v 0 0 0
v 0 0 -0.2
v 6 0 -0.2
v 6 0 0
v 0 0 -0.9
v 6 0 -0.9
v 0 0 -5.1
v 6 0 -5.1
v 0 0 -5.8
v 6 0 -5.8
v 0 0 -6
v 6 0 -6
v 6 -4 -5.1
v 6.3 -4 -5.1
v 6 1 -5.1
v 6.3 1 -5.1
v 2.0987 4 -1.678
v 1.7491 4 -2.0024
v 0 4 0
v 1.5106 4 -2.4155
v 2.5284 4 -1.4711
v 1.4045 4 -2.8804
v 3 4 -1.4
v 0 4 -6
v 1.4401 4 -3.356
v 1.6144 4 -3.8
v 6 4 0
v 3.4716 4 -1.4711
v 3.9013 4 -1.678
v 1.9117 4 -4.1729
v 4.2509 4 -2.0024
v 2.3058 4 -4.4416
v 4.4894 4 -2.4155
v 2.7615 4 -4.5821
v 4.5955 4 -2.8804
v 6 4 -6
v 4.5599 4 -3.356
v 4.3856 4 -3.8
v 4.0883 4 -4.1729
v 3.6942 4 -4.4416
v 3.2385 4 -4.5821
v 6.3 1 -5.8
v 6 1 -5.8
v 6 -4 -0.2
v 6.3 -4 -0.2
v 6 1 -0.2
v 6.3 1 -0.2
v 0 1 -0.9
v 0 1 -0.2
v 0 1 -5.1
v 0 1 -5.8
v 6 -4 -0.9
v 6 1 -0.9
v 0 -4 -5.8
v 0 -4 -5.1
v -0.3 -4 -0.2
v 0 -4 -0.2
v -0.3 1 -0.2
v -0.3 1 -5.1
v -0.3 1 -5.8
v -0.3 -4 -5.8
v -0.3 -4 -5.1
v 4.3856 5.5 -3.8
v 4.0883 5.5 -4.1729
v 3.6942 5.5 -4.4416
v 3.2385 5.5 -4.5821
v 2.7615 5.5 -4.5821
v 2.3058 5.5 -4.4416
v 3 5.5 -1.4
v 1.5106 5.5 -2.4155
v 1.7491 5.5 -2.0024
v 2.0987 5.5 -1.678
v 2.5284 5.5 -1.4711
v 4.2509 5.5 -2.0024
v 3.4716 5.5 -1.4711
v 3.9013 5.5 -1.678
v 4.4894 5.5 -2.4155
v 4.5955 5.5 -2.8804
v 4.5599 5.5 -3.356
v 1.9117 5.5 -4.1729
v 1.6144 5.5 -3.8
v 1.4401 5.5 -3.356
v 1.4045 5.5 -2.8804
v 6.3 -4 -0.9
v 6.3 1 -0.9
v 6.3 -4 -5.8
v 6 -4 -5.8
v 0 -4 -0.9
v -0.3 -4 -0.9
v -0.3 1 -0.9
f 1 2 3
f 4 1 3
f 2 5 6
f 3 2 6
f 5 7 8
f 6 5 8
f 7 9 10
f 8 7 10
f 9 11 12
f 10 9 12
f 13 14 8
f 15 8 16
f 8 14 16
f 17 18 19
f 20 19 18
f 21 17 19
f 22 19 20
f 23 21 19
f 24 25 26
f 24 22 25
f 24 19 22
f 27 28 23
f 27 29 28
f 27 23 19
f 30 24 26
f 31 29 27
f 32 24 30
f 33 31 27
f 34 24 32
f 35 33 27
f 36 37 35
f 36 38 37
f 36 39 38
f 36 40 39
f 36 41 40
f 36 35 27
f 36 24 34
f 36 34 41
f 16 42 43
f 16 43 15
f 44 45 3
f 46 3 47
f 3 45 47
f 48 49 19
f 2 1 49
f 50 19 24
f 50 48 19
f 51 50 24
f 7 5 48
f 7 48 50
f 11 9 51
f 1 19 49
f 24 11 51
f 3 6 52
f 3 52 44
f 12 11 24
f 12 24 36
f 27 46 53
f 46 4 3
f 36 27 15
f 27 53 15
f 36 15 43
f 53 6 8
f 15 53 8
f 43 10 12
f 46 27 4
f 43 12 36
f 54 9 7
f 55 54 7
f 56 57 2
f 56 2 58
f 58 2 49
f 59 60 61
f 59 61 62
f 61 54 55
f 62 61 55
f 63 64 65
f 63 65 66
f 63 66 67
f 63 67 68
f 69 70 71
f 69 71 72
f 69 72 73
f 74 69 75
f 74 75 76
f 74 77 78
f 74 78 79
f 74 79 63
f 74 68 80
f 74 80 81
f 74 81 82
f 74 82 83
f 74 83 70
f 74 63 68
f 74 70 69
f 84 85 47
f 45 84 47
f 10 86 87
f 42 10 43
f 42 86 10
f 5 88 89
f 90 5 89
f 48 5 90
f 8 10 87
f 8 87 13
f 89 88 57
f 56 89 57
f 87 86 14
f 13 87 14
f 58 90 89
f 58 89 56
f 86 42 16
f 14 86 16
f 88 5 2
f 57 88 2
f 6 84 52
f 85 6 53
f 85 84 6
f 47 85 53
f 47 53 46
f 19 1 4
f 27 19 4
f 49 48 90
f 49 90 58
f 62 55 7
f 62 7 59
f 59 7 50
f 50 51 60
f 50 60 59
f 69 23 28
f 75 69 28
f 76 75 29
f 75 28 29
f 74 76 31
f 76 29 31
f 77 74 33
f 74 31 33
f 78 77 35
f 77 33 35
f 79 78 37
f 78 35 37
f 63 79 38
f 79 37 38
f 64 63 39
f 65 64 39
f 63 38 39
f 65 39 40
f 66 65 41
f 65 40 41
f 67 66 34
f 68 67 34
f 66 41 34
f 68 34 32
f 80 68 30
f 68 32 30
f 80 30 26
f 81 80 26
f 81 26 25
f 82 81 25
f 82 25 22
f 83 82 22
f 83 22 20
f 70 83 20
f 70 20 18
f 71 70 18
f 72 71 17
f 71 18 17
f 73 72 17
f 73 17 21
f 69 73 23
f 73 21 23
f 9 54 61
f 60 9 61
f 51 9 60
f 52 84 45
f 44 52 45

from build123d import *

# Parameters (mm, degrees)
SKETCH1_W                 = 6
SKETCH1_H                 = 6
BOSS_EXTRUDE1_DEPTH       = 4
SKETCH2_R                 = 1.6
BOSS_EXTRUDE2_DEPTH       = 1.5
SKETCH3_W                 = 0.7
SKETCH3_H                 = 5
BOSS_EXTRUDE3_DEPTH       = 0.3
LPATTERN2_COUNT           = 2
LPATTERN2_PITCH           = 6.3
LPATTERN3_COUNT           = 2
LPATTERN3_PITCH           = 4.9
LPATTERN3_COPY_1_SKETCH_W = 0.7
LPATTERN3_COPY_1_SKETCH_H = 5
LPATTERN3_COPY_1_DEPTH    = 0.3


with BuildPart() as part:
    # Sketch1 → Boss-Extrude1 (new body)
    with BuildSketch(Plane(origin=(0, 0, 0), x_dir=(1, 0, 0), z_dir=(0, 1, 0))):
        with Locations((3, 3)):
            Rectangle(SKETCH1_W, SKETCH1_H)
    extrude(amount=BOSS_EXTRUDE1_DEPTH)

    # Sketch2 → Boss-Extrude2 (add)
    with BuildSketch(Plane(origin=(0, 4, 0), x_dir=(1, 0, 0), z_dir=(0, 1, 0))):
        with Locations(Location((3, 3, 0), (0, 0, 270))):
            Circle(SKETCH2_R)
    extrude(amount=BOSS_EXTRUDE2_DEPTH)

    # Sketch3 → Boss-Extrude3 (add)
    with BuildSketch(Plane.ZY):
        with Locations((-0.55, -1.5)):
            Rectangle(SKETCH3_W, SKETCH3_H)
    boss_extrude3 = extrude(amount=BOSS_EXTRUDE3_DEPTH)

    # LPattern2: Boss-Extrude3 ×2
    with Locations(*[(i * LPATTERN2_PITCH, 0, 0) for i in range(1, LPATTERN2_COUNT)]):
        add(boss_extrude3)

    # LPattern3: Boss-Extrude3 ×2
    with Locations(*[(0, 0, -i * LPATTERN3_PITCH) for i in range(1, LPATTERN3_COUNT)]):
        add(boss_extrude3)

    # LPattern3 copy 1 sketch → LPattern3 copy 1 (add)
    with BuildSketch(Plane(origin=(6.3, 0, -4.9), x_dir=(0, 0, 1), z_dir=(-1, 0, 0))):
        with Locations((-0.55, -1.5)):
            Rectangle(LPATTERN3_COPY_1_SKETCH_W, LPATTERN3_COPY_1_SKETCH_H)
    extrude(amount=LPATTERN3_COPY_1_DEPTH)


solid = part.part
